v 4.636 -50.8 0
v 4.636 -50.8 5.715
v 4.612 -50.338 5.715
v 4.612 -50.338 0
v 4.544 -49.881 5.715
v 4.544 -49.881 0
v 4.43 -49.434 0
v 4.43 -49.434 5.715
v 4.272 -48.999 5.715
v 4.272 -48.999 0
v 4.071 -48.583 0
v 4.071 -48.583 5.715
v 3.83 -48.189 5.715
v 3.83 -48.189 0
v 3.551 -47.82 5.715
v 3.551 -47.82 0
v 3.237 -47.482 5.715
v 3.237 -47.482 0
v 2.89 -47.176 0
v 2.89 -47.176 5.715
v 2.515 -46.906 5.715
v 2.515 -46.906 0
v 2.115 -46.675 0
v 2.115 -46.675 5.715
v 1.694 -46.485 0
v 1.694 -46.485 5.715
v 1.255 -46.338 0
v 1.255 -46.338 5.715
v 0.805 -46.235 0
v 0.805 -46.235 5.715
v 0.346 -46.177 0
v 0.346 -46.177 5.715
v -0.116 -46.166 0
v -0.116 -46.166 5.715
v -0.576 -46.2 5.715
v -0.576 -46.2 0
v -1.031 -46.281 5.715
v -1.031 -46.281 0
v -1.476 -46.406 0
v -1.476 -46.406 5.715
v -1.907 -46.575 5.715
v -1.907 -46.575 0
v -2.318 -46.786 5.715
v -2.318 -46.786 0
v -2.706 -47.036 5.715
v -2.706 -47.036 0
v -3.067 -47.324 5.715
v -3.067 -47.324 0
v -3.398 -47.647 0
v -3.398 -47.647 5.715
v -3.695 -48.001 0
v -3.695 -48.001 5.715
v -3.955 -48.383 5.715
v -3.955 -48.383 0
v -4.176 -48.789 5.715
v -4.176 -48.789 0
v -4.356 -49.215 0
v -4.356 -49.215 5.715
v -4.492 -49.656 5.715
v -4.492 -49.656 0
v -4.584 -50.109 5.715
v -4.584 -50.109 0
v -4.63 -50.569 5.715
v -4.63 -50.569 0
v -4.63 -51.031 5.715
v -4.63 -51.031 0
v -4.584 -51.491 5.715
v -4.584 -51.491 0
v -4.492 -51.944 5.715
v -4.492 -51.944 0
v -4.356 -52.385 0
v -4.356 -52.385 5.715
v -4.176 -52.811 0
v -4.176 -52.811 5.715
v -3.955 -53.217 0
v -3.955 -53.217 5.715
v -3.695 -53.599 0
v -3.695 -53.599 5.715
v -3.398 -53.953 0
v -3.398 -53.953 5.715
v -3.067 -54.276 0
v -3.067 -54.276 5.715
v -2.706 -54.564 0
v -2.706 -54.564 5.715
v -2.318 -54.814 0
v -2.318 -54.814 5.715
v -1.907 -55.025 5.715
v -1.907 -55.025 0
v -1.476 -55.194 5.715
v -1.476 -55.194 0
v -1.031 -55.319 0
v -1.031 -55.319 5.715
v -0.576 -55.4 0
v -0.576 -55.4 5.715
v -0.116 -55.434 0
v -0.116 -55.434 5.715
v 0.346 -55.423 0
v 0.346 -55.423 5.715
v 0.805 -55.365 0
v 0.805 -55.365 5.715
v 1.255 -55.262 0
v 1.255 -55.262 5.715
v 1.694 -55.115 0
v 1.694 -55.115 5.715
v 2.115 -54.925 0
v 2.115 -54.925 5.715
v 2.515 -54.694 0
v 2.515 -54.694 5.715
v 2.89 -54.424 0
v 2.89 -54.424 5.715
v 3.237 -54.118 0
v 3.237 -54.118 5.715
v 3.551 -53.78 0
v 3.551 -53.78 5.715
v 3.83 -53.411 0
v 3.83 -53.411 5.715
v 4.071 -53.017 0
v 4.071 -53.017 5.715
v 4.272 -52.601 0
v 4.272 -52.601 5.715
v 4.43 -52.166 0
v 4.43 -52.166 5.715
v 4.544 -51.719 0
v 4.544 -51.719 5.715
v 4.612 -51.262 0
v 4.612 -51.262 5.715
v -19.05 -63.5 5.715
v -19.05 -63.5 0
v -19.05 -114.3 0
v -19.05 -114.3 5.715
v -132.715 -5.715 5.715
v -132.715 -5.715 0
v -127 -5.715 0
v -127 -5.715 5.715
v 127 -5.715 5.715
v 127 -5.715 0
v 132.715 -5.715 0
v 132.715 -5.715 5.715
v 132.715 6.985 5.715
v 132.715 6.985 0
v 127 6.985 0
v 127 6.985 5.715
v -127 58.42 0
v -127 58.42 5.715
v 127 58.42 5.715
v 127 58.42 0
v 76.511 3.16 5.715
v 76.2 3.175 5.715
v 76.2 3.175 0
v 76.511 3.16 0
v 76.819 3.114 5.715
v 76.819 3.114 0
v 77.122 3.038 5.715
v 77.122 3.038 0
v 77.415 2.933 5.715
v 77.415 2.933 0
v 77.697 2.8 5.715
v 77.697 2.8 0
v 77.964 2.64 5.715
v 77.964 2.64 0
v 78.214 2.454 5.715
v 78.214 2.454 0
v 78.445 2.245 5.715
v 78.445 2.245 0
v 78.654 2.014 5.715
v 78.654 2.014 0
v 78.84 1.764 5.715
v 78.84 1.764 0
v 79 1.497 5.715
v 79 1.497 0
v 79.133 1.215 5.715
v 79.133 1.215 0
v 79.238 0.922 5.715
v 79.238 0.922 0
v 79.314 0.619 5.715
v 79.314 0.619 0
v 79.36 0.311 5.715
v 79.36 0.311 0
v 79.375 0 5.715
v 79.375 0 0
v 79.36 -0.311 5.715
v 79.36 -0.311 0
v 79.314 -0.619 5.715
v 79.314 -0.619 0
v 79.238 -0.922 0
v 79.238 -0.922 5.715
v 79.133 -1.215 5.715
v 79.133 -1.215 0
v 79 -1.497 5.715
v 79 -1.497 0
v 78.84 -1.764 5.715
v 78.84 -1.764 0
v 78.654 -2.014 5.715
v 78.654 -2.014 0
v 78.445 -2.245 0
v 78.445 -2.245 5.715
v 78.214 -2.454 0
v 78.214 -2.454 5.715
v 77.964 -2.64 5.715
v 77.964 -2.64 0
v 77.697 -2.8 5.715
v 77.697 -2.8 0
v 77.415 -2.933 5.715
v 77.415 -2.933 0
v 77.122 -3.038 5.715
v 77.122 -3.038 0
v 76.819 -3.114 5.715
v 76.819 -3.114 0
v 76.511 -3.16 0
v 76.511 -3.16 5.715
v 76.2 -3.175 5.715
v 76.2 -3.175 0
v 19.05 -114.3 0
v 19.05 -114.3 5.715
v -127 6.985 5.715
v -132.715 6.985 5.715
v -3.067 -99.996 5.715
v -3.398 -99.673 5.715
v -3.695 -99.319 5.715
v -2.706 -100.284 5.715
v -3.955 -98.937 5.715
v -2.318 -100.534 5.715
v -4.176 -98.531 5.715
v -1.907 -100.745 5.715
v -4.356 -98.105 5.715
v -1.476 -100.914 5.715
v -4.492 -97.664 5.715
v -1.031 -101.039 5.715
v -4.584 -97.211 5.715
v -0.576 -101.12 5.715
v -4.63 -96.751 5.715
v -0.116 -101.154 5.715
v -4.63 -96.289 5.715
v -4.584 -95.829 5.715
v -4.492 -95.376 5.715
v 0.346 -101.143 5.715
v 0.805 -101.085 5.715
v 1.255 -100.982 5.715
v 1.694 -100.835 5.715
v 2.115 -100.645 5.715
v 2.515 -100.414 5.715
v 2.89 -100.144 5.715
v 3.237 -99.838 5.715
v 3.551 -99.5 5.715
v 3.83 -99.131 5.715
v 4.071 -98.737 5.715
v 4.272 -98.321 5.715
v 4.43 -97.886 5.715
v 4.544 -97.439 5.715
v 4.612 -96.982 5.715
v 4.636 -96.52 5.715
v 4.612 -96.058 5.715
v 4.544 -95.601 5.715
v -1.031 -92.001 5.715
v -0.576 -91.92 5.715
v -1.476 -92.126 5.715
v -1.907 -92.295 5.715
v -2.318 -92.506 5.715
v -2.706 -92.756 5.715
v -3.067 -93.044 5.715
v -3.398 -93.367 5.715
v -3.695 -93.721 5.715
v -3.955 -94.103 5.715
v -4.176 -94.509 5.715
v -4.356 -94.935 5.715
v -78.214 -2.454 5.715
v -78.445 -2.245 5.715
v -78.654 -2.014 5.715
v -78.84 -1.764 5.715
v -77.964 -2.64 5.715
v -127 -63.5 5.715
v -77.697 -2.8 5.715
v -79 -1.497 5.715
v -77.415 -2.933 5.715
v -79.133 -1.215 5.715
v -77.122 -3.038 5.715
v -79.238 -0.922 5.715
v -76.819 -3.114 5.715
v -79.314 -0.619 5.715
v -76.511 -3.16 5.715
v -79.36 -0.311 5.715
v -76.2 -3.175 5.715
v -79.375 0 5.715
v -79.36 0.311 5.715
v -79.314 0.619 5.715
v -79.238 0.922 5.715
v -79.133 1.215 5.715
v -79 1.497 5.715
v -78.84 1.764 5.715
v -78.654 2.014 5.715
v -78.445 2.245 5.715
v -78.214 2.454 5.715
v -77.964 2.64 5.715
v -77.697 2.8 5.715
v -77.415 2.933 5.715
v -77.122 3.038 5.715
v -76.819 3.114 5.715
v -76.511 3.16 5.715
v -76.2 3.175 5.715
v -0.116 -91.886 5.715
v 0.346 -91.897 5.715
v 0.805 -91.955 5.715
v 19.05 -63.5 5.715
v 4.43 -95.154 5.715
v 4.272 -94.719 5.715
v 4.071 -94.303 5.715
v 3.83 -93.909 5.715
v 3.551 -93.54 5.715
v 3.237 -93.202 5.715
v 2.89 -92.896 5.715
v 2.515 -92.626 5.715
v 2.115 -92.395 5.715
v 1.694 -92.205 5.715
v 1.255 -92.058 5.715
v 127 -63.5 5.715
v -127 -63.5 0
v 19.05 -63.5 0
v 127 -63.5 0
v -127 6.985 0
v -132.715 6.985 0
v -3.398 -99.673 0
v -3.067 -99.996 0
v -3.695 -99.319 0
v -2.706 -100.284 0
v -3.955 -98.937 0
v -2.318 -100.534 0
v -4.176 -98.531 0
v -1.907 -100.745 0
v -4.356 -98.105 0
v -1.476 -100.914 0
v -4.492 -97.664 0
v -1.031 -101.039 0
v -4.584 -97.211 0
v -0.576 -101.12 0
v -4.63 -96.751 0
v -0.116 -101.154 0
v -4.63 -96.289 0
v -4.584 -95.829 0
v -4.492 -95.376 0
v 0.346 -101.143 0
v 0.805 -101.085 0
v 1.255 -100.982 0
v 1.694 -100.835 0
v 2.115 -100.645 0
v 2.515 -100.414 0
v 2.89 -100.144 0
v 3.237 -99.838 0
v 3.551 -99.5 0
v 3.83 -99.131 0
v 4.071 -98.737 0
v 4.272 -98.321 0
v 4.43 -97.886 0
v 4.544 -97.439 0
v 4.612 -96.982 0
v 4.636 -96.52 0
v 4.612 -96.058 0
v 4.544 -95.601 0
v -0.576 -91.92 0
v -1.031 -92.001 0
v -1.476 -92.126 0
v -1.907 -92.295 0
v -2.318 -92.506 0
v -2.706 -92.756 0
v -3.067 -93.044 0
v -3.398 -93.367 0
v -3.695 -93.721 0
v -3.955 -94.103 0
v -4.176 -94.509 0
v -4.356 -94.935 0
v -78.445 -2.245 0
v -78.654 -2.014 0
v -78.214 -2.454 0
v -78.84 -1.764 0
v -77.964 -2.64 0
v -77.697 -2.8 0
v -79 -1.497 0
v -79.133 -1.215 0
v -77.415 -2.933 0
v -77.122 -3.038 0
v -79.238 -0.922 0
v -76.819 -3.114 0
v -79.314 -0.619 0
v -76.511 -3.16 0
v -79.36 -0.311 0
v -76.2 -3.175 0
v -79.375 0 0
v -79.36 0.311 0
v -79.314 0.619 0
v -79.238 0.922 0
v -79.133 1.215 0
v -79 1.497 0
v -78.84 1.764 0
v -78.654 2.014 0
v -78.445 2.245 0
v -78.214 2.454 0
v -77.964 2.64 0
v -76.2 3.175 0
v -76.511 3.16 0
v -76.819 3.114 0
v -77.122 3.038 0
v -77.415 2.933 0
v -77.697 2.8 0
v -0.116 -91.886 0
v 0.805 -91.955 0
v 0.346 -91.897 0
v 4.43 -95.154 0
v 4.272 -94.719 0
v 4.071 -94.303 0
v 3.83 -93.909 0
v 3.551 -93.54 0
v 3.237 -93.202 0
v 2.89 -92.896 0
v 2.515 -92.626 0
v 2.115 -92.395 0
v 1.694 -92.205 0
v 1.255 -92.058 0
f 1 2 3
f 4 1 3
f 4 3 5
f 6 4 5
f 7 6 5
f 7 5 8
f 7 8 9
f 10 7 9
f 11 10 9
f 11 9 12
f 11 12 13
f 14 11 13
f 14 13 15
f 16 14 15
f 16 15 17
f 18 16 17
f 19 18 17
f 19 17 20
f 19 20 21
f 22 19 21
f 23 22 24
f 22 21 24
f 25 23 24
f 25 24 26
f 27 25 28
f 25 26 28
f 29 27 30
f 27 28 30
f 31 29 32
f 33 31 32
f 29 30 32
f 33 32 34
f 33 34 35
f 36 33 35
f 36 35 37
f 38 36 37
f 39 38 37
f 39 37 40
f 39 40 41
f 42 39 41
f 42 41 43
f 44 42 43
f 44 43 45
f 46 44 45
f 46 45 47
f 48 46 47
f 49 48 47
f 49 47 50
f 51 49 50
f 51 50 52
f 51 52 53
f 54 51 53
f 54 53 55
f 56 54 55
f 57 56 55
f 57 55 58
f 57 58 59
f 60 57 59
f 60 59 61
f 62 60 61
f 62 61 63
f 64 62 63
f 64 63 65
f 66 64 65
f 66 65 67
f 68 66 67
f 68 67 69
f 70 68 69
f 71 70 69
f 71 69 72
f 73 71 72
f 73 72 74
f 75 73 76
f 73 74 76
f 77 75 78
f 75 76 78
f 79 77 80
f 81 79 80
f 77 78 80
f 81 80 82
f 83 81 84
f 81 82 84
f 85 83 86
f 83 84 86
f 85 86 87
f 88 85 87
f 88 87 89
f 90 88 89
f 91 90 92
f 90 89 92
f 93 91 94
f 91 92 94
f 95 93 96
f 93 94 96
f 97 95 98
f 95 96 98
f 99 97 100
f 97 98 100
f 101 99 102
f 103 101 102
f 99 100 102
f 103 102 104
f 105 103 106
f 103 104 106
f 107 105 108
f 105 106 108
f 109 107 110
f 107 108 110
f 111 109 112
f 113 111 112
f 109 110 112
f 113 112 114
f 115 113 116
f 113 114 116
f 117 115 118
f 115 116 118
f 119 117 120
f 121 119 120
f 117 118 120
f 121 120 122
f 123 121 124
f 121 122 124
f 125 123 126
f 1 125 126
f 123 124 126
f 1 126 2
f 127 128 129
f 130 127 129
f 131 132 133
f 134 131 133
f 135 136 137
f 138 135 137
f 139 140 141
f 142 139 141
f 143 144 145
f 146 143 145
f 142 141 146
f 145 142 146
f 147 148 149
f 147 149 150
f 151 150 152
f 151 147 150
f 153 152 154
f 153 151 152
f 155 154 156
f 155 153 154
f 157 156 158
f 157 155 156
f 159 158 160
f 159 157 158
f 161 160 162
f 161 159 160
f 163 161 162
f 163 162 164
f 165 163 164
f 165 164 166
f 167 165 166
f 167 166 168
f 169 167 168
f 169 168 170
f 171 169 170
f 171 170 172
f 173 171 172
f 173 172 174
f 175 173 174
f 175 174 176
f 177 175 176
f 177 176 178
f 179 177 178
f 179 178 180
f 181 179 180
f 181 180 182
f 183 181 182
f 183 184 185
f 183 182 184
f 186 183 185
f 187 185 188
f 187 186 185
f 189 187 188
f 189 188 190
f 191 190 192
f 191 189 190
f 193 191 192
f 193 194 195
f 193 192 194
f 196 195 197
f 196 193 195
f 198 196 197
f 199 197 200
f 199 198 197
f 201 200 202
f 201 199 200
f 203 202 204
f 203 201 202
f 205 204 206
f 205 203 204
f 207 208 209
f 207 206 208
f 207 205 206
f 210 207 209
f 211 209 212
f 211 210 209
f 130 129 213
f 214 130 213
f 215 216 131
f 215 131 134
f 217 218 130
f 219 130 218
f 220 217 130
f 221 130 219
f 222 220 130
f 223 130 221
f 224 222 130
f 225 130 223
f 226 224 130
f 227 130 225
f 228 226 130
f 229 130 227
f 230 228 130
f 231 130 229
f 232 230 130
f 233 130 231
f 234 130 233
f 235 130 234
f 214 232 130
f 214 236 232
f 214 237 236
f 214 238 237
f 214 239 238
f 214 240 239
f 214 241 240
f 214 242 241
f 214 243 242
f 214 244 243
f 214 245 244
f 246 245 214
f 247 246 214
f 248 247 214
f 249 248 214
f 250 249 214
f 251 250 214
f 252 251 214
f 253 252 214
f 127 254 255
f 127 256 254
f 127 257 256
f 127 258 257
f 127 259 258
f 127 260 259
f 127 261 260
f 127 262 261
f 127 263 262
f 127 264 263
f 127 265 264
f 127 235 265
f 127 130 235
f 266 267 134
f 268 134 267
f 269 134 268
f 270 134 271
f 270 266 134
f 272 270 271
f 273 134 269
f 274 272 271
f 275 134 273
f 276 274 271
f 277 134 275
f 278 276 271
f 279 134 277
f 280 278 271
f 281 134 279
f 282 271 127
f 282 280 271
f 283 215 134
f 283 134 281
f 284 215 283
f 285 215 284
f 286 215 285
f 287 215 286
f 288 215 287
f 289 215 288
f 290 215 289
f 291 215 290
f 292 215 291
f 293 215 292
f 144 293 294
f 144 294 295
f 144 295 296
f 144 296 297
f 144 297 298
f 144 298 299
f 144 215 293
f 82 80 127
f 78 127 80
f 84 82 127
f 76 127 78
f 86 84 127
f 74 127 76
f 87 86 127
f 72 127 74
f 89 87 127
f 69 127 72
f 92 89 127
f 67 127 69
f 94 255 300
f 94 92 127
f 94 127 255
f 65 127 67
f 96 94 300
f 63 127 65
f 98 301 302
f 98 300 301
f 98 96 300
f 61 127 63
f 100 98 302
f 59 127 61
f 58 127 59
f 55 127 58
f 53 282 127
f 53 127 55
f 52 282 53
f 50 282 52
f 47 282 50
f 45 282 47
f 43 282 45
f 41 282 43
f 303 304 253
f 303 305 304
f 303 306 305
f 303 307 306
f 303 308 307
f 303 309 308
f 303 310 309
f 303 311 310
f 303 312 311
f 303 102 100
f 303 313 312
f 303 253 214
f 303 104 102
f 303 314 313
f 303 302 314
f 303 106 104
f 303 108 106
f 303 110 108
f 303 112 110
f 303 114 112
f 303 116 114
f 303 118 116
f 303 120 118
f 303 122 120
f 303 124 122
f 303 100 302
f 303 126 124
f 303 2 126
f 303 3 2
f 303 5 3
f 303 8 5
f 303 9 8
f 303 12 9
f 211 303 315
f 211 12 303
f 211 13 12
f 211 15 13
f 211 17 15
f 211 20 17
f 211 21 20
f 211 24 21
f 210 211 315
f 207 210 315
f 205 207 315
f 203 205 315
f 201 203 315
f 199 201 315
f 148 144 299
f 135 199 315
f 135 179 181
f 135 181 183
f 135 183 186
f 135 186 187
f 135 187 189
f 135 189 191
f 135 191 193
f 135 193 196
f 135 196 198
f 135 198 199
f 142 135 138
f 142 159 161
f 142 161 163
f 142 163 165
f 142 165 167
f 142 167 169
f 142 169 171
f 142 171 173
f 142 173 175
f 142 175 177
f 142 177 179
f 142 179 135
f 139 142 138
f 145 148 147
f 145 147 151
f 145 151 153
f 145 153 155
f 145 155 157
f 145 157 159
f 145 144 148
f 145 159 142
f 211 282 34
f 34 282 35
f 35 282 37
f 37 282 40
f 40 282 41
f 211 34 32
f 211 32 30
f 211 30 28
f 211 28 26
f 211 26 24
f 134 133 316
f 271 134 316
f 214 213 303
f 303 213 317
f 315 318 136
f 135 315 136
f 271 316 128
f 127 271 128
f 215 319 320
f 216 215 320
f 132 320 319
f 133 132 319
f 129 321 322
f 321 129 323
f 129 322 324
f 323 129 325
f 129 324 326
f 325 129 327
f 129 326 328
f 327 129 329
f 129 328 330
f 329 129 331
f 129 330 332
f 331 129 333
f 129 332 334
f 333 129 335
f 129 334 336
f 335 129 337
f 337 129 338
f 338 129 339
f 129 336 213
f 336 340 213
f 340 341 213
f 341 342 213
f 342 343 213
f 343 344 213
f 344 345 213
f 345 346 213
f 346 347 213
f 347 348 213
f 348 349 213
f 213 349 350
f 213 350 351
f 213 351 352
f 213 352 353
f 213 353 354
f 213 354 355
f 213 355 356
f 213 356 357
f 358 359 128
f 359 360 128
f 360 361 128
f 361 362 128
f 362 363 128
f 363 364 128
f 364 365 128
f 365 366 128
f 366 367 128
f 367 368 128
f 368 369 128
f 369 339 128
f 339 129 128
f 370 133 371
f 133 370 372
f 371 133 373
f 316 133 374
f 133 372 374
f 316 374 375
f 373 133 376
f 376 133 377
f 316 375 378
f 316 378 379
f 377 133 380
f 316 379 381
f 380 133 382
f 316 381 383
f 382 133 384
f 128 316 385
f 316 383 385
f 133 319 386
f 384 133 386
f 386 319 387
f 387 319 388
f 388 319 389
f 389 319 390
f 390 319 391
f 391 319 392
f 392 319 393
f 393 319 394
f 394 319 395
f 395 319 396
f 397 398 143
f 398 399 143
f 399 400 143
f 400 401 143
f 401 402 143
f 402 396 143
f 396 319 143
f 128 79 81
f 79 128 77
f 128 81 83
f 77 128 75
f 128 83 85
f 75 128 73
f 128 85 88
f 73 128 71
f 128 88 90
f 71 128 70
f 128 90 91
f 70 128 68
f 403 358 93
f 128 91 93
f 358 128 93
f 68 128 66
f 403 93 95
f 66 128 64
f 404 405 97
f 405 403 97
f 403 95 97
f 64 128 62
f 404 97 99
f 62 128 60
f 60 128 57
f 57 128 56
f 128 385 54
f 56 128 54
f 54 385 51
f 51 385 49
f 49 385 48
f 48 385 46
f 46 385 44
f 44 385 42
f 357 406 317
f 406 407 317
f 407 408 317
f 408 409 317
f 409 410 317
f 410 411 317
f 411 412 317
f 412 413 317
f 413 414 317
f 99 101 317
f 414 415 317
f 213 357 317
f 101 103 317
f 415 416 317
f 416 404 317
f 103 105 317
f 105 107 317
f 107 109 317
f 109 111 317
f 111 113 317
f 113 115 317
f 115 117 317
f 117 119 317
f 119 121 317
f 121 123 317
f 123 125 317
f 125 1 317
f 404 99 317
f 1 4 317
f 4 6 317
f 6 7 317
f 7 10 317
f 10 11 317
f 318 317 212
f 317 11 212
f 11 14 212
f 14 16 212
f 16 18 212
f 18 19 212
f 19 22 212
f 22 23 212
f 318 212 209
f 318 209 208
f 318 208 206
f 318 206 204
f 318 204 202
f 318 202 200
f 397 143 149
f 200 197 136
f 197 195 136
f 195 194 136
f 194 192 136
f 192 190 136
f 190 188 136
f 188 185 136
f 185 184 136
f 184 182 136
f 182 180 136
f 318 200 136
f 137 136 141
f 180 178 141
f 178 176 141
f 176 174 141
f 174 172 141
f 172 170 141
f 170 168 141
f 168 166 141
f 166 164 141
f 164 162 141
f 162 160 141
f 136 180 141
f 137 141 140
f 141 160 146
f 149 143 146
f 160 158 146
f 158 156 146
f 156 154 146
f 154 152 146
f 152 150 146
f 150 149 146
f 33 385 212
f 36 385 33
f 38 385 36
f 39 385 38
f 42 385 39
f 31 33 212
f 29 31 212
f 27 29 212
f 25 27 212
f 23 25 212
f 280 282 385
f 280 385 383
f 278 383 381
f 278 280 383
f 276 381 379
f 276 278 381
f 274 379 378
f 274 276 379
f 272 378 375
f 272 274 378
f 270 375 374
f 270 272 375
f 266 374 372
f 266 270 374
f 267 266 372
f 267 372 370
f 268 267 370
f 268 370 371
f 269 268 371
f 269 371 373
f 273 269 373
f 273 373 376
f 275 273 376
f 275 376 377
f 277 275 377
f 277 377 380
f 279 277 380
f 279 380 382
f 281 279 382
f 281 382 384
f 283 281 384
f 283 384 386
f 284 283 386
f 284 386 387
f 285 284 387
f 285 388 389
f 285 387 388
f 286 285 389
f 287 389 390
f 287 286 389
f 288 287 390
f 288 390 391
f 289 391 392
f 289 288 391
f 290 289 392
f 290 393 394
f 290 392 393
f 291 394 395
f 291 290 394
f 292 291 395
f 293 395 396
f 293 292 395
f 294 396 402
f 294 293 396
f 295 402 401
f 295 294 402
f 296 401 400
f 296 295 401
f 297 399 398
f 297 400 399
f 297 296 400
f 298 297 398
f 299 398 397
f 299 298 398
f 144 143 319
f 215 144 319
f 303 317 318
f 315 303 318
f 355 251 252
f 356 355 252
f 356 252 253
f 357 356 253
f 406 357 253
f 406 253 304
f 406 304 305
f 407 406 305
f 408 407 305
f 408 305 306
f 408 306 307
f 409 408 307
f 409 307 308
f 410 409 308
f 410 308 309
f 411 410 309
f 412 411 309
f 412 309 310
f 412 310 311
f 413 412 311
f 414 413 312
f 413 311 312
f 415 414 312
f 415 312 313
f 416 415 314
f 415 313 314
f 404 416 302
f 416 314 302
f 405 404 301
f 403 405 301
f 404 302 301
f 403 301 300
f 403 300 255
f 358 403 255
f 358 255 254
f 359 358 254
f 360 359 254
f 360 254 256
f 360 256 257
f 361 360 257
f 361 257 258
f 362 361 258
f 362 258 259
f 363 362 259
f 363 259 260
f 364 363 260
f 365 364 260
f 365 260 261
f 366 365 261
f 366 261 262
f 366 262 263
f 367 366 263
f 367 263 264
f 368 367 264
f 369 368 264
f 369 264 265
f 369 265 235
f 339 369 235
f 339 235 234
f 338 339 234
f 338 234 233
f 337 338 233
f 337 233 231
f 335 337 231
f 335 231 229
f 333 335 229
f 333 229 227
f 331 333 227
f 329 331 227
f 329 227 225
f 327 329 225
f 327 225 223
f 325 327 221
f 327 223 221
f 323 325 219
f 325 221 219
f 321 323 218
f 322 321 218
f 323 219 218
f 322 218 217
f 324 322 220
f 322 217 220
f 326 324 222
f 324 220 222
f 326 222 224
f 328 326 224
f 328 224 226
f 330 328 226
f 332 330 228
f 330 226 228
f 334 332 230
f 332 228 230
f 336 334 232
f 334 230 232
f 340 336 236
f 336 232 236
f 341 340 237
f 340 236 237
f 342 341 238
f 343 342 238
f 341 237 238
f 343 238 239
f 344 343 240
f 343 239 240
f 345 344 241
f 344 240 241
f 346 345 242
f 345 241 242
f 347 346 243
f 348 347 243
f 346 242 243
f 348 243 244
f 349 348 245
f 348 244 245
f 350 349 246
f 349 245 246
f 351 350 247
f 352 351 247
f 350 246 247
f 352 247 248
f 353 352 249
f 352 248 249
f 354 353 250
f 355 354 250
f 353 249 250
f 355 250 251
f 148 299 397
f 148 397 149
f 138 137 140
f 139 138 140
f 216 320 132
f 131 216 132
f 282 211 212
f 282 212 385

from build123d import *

# Parameters (mm, degrees)
BOSS_EXTRUDE1_DEPTH     = 5.715
CUT_EXTRUDE1_DEPTH      = 6.715
SKETCH4_R               = 4.6355
CUT_EXTRUDE2_DEPTH      = 1
CUT_EXTRUDE2_DEPTH_BACK = 6.715
SKETCH5_W               = 254
SKETCH5_H               = 5.08
CUT_EXTRUDE3_DEPTH      = 6.715
SKETCH6_R               = 4.6355
CUT_EXTRUDE4_DEPTH      = 6.715


with BuildPart() as part:
    # Sketch1 → Boss-Extrude1 (new body)
    with BuildSketch(Plane.XY):
        Polygon((19.05, -63.5), (127, -63.5), (127, -5.715), (132.715, -5.715), (132.715, 6.985), (127, 6.985), (127, 63.5), (-127, 63.5), (-127, 6.985), (-132.715, 6.985), (-132.715, -5.715), (-127, -5.715), (-127, -63.5), (-19.05, -63.5), (-19.05, -114.3), (19.05, -114.3), align=None)
    extrude(amount=BOSS_EXTRUDE1_DEPTH)

    # Sketch2 → Cut-Extrude1 (cut, through all)
    with BuildSketch(Plane.XY.offset(5.715)):
        with BuildLine():
            Line((76.2, -3.175), (-76.2, -3.175))
            ThreePointArc((-76.2, -3.175), (-79.375, 0), (-76.2, 3.175))
            Line((-76.2, 3.175), (76.2, 3.175))
            ThreePointArc((76.2, 3.175), (79.375, 0), (76.2, -3.175))
        make_face()
    extrude(amount=-CUT_EXTRUDE1_DEPTH, mode=Mode.SUBTRACT)

    # Sketch4 → Cut-Extrude2 (cut, two sides)
    with BuildSketch(Plane.XY.offset(5.715)) as cut_extrude2_sk:
        with Locations((0, -50.8)):
            Circle(SKETCH4_R)
    extrude(amount=CUT_EXTRUDE2_DEPTH, mode=Mode.SUBTRACT)
    extrude(cut_extrude2_sk.sketch, amount=-CUT_EXTRUDE2_DEPTH_BACK, mode=Mode.SUBTRACT)

    # Sketch5 → Cut-Extrude3 (cut, through all)
    with BuildSketch(Plane.XY.offset(5.715)):
        with Locations((0, 60.96)):
            Rectangle(SKETCH5_W, SKETCH5_H)
    extrude(amount=-CUT_EXTRUDE3_DEPTH, mode=Mode.SUBTRACT)

    # Sketch6 → Cut-Extrude4 (cut, through all)
    with BuildSketch(Plane.XY.offset(5.715)):
        with Locations((0, -96.52)):
            Circle(SKETCH6_R)
    extrude(amount=-CUT_EXTRUDE4_DEPTH, mode=Mode.SUBTRACT)


solid = part.part
